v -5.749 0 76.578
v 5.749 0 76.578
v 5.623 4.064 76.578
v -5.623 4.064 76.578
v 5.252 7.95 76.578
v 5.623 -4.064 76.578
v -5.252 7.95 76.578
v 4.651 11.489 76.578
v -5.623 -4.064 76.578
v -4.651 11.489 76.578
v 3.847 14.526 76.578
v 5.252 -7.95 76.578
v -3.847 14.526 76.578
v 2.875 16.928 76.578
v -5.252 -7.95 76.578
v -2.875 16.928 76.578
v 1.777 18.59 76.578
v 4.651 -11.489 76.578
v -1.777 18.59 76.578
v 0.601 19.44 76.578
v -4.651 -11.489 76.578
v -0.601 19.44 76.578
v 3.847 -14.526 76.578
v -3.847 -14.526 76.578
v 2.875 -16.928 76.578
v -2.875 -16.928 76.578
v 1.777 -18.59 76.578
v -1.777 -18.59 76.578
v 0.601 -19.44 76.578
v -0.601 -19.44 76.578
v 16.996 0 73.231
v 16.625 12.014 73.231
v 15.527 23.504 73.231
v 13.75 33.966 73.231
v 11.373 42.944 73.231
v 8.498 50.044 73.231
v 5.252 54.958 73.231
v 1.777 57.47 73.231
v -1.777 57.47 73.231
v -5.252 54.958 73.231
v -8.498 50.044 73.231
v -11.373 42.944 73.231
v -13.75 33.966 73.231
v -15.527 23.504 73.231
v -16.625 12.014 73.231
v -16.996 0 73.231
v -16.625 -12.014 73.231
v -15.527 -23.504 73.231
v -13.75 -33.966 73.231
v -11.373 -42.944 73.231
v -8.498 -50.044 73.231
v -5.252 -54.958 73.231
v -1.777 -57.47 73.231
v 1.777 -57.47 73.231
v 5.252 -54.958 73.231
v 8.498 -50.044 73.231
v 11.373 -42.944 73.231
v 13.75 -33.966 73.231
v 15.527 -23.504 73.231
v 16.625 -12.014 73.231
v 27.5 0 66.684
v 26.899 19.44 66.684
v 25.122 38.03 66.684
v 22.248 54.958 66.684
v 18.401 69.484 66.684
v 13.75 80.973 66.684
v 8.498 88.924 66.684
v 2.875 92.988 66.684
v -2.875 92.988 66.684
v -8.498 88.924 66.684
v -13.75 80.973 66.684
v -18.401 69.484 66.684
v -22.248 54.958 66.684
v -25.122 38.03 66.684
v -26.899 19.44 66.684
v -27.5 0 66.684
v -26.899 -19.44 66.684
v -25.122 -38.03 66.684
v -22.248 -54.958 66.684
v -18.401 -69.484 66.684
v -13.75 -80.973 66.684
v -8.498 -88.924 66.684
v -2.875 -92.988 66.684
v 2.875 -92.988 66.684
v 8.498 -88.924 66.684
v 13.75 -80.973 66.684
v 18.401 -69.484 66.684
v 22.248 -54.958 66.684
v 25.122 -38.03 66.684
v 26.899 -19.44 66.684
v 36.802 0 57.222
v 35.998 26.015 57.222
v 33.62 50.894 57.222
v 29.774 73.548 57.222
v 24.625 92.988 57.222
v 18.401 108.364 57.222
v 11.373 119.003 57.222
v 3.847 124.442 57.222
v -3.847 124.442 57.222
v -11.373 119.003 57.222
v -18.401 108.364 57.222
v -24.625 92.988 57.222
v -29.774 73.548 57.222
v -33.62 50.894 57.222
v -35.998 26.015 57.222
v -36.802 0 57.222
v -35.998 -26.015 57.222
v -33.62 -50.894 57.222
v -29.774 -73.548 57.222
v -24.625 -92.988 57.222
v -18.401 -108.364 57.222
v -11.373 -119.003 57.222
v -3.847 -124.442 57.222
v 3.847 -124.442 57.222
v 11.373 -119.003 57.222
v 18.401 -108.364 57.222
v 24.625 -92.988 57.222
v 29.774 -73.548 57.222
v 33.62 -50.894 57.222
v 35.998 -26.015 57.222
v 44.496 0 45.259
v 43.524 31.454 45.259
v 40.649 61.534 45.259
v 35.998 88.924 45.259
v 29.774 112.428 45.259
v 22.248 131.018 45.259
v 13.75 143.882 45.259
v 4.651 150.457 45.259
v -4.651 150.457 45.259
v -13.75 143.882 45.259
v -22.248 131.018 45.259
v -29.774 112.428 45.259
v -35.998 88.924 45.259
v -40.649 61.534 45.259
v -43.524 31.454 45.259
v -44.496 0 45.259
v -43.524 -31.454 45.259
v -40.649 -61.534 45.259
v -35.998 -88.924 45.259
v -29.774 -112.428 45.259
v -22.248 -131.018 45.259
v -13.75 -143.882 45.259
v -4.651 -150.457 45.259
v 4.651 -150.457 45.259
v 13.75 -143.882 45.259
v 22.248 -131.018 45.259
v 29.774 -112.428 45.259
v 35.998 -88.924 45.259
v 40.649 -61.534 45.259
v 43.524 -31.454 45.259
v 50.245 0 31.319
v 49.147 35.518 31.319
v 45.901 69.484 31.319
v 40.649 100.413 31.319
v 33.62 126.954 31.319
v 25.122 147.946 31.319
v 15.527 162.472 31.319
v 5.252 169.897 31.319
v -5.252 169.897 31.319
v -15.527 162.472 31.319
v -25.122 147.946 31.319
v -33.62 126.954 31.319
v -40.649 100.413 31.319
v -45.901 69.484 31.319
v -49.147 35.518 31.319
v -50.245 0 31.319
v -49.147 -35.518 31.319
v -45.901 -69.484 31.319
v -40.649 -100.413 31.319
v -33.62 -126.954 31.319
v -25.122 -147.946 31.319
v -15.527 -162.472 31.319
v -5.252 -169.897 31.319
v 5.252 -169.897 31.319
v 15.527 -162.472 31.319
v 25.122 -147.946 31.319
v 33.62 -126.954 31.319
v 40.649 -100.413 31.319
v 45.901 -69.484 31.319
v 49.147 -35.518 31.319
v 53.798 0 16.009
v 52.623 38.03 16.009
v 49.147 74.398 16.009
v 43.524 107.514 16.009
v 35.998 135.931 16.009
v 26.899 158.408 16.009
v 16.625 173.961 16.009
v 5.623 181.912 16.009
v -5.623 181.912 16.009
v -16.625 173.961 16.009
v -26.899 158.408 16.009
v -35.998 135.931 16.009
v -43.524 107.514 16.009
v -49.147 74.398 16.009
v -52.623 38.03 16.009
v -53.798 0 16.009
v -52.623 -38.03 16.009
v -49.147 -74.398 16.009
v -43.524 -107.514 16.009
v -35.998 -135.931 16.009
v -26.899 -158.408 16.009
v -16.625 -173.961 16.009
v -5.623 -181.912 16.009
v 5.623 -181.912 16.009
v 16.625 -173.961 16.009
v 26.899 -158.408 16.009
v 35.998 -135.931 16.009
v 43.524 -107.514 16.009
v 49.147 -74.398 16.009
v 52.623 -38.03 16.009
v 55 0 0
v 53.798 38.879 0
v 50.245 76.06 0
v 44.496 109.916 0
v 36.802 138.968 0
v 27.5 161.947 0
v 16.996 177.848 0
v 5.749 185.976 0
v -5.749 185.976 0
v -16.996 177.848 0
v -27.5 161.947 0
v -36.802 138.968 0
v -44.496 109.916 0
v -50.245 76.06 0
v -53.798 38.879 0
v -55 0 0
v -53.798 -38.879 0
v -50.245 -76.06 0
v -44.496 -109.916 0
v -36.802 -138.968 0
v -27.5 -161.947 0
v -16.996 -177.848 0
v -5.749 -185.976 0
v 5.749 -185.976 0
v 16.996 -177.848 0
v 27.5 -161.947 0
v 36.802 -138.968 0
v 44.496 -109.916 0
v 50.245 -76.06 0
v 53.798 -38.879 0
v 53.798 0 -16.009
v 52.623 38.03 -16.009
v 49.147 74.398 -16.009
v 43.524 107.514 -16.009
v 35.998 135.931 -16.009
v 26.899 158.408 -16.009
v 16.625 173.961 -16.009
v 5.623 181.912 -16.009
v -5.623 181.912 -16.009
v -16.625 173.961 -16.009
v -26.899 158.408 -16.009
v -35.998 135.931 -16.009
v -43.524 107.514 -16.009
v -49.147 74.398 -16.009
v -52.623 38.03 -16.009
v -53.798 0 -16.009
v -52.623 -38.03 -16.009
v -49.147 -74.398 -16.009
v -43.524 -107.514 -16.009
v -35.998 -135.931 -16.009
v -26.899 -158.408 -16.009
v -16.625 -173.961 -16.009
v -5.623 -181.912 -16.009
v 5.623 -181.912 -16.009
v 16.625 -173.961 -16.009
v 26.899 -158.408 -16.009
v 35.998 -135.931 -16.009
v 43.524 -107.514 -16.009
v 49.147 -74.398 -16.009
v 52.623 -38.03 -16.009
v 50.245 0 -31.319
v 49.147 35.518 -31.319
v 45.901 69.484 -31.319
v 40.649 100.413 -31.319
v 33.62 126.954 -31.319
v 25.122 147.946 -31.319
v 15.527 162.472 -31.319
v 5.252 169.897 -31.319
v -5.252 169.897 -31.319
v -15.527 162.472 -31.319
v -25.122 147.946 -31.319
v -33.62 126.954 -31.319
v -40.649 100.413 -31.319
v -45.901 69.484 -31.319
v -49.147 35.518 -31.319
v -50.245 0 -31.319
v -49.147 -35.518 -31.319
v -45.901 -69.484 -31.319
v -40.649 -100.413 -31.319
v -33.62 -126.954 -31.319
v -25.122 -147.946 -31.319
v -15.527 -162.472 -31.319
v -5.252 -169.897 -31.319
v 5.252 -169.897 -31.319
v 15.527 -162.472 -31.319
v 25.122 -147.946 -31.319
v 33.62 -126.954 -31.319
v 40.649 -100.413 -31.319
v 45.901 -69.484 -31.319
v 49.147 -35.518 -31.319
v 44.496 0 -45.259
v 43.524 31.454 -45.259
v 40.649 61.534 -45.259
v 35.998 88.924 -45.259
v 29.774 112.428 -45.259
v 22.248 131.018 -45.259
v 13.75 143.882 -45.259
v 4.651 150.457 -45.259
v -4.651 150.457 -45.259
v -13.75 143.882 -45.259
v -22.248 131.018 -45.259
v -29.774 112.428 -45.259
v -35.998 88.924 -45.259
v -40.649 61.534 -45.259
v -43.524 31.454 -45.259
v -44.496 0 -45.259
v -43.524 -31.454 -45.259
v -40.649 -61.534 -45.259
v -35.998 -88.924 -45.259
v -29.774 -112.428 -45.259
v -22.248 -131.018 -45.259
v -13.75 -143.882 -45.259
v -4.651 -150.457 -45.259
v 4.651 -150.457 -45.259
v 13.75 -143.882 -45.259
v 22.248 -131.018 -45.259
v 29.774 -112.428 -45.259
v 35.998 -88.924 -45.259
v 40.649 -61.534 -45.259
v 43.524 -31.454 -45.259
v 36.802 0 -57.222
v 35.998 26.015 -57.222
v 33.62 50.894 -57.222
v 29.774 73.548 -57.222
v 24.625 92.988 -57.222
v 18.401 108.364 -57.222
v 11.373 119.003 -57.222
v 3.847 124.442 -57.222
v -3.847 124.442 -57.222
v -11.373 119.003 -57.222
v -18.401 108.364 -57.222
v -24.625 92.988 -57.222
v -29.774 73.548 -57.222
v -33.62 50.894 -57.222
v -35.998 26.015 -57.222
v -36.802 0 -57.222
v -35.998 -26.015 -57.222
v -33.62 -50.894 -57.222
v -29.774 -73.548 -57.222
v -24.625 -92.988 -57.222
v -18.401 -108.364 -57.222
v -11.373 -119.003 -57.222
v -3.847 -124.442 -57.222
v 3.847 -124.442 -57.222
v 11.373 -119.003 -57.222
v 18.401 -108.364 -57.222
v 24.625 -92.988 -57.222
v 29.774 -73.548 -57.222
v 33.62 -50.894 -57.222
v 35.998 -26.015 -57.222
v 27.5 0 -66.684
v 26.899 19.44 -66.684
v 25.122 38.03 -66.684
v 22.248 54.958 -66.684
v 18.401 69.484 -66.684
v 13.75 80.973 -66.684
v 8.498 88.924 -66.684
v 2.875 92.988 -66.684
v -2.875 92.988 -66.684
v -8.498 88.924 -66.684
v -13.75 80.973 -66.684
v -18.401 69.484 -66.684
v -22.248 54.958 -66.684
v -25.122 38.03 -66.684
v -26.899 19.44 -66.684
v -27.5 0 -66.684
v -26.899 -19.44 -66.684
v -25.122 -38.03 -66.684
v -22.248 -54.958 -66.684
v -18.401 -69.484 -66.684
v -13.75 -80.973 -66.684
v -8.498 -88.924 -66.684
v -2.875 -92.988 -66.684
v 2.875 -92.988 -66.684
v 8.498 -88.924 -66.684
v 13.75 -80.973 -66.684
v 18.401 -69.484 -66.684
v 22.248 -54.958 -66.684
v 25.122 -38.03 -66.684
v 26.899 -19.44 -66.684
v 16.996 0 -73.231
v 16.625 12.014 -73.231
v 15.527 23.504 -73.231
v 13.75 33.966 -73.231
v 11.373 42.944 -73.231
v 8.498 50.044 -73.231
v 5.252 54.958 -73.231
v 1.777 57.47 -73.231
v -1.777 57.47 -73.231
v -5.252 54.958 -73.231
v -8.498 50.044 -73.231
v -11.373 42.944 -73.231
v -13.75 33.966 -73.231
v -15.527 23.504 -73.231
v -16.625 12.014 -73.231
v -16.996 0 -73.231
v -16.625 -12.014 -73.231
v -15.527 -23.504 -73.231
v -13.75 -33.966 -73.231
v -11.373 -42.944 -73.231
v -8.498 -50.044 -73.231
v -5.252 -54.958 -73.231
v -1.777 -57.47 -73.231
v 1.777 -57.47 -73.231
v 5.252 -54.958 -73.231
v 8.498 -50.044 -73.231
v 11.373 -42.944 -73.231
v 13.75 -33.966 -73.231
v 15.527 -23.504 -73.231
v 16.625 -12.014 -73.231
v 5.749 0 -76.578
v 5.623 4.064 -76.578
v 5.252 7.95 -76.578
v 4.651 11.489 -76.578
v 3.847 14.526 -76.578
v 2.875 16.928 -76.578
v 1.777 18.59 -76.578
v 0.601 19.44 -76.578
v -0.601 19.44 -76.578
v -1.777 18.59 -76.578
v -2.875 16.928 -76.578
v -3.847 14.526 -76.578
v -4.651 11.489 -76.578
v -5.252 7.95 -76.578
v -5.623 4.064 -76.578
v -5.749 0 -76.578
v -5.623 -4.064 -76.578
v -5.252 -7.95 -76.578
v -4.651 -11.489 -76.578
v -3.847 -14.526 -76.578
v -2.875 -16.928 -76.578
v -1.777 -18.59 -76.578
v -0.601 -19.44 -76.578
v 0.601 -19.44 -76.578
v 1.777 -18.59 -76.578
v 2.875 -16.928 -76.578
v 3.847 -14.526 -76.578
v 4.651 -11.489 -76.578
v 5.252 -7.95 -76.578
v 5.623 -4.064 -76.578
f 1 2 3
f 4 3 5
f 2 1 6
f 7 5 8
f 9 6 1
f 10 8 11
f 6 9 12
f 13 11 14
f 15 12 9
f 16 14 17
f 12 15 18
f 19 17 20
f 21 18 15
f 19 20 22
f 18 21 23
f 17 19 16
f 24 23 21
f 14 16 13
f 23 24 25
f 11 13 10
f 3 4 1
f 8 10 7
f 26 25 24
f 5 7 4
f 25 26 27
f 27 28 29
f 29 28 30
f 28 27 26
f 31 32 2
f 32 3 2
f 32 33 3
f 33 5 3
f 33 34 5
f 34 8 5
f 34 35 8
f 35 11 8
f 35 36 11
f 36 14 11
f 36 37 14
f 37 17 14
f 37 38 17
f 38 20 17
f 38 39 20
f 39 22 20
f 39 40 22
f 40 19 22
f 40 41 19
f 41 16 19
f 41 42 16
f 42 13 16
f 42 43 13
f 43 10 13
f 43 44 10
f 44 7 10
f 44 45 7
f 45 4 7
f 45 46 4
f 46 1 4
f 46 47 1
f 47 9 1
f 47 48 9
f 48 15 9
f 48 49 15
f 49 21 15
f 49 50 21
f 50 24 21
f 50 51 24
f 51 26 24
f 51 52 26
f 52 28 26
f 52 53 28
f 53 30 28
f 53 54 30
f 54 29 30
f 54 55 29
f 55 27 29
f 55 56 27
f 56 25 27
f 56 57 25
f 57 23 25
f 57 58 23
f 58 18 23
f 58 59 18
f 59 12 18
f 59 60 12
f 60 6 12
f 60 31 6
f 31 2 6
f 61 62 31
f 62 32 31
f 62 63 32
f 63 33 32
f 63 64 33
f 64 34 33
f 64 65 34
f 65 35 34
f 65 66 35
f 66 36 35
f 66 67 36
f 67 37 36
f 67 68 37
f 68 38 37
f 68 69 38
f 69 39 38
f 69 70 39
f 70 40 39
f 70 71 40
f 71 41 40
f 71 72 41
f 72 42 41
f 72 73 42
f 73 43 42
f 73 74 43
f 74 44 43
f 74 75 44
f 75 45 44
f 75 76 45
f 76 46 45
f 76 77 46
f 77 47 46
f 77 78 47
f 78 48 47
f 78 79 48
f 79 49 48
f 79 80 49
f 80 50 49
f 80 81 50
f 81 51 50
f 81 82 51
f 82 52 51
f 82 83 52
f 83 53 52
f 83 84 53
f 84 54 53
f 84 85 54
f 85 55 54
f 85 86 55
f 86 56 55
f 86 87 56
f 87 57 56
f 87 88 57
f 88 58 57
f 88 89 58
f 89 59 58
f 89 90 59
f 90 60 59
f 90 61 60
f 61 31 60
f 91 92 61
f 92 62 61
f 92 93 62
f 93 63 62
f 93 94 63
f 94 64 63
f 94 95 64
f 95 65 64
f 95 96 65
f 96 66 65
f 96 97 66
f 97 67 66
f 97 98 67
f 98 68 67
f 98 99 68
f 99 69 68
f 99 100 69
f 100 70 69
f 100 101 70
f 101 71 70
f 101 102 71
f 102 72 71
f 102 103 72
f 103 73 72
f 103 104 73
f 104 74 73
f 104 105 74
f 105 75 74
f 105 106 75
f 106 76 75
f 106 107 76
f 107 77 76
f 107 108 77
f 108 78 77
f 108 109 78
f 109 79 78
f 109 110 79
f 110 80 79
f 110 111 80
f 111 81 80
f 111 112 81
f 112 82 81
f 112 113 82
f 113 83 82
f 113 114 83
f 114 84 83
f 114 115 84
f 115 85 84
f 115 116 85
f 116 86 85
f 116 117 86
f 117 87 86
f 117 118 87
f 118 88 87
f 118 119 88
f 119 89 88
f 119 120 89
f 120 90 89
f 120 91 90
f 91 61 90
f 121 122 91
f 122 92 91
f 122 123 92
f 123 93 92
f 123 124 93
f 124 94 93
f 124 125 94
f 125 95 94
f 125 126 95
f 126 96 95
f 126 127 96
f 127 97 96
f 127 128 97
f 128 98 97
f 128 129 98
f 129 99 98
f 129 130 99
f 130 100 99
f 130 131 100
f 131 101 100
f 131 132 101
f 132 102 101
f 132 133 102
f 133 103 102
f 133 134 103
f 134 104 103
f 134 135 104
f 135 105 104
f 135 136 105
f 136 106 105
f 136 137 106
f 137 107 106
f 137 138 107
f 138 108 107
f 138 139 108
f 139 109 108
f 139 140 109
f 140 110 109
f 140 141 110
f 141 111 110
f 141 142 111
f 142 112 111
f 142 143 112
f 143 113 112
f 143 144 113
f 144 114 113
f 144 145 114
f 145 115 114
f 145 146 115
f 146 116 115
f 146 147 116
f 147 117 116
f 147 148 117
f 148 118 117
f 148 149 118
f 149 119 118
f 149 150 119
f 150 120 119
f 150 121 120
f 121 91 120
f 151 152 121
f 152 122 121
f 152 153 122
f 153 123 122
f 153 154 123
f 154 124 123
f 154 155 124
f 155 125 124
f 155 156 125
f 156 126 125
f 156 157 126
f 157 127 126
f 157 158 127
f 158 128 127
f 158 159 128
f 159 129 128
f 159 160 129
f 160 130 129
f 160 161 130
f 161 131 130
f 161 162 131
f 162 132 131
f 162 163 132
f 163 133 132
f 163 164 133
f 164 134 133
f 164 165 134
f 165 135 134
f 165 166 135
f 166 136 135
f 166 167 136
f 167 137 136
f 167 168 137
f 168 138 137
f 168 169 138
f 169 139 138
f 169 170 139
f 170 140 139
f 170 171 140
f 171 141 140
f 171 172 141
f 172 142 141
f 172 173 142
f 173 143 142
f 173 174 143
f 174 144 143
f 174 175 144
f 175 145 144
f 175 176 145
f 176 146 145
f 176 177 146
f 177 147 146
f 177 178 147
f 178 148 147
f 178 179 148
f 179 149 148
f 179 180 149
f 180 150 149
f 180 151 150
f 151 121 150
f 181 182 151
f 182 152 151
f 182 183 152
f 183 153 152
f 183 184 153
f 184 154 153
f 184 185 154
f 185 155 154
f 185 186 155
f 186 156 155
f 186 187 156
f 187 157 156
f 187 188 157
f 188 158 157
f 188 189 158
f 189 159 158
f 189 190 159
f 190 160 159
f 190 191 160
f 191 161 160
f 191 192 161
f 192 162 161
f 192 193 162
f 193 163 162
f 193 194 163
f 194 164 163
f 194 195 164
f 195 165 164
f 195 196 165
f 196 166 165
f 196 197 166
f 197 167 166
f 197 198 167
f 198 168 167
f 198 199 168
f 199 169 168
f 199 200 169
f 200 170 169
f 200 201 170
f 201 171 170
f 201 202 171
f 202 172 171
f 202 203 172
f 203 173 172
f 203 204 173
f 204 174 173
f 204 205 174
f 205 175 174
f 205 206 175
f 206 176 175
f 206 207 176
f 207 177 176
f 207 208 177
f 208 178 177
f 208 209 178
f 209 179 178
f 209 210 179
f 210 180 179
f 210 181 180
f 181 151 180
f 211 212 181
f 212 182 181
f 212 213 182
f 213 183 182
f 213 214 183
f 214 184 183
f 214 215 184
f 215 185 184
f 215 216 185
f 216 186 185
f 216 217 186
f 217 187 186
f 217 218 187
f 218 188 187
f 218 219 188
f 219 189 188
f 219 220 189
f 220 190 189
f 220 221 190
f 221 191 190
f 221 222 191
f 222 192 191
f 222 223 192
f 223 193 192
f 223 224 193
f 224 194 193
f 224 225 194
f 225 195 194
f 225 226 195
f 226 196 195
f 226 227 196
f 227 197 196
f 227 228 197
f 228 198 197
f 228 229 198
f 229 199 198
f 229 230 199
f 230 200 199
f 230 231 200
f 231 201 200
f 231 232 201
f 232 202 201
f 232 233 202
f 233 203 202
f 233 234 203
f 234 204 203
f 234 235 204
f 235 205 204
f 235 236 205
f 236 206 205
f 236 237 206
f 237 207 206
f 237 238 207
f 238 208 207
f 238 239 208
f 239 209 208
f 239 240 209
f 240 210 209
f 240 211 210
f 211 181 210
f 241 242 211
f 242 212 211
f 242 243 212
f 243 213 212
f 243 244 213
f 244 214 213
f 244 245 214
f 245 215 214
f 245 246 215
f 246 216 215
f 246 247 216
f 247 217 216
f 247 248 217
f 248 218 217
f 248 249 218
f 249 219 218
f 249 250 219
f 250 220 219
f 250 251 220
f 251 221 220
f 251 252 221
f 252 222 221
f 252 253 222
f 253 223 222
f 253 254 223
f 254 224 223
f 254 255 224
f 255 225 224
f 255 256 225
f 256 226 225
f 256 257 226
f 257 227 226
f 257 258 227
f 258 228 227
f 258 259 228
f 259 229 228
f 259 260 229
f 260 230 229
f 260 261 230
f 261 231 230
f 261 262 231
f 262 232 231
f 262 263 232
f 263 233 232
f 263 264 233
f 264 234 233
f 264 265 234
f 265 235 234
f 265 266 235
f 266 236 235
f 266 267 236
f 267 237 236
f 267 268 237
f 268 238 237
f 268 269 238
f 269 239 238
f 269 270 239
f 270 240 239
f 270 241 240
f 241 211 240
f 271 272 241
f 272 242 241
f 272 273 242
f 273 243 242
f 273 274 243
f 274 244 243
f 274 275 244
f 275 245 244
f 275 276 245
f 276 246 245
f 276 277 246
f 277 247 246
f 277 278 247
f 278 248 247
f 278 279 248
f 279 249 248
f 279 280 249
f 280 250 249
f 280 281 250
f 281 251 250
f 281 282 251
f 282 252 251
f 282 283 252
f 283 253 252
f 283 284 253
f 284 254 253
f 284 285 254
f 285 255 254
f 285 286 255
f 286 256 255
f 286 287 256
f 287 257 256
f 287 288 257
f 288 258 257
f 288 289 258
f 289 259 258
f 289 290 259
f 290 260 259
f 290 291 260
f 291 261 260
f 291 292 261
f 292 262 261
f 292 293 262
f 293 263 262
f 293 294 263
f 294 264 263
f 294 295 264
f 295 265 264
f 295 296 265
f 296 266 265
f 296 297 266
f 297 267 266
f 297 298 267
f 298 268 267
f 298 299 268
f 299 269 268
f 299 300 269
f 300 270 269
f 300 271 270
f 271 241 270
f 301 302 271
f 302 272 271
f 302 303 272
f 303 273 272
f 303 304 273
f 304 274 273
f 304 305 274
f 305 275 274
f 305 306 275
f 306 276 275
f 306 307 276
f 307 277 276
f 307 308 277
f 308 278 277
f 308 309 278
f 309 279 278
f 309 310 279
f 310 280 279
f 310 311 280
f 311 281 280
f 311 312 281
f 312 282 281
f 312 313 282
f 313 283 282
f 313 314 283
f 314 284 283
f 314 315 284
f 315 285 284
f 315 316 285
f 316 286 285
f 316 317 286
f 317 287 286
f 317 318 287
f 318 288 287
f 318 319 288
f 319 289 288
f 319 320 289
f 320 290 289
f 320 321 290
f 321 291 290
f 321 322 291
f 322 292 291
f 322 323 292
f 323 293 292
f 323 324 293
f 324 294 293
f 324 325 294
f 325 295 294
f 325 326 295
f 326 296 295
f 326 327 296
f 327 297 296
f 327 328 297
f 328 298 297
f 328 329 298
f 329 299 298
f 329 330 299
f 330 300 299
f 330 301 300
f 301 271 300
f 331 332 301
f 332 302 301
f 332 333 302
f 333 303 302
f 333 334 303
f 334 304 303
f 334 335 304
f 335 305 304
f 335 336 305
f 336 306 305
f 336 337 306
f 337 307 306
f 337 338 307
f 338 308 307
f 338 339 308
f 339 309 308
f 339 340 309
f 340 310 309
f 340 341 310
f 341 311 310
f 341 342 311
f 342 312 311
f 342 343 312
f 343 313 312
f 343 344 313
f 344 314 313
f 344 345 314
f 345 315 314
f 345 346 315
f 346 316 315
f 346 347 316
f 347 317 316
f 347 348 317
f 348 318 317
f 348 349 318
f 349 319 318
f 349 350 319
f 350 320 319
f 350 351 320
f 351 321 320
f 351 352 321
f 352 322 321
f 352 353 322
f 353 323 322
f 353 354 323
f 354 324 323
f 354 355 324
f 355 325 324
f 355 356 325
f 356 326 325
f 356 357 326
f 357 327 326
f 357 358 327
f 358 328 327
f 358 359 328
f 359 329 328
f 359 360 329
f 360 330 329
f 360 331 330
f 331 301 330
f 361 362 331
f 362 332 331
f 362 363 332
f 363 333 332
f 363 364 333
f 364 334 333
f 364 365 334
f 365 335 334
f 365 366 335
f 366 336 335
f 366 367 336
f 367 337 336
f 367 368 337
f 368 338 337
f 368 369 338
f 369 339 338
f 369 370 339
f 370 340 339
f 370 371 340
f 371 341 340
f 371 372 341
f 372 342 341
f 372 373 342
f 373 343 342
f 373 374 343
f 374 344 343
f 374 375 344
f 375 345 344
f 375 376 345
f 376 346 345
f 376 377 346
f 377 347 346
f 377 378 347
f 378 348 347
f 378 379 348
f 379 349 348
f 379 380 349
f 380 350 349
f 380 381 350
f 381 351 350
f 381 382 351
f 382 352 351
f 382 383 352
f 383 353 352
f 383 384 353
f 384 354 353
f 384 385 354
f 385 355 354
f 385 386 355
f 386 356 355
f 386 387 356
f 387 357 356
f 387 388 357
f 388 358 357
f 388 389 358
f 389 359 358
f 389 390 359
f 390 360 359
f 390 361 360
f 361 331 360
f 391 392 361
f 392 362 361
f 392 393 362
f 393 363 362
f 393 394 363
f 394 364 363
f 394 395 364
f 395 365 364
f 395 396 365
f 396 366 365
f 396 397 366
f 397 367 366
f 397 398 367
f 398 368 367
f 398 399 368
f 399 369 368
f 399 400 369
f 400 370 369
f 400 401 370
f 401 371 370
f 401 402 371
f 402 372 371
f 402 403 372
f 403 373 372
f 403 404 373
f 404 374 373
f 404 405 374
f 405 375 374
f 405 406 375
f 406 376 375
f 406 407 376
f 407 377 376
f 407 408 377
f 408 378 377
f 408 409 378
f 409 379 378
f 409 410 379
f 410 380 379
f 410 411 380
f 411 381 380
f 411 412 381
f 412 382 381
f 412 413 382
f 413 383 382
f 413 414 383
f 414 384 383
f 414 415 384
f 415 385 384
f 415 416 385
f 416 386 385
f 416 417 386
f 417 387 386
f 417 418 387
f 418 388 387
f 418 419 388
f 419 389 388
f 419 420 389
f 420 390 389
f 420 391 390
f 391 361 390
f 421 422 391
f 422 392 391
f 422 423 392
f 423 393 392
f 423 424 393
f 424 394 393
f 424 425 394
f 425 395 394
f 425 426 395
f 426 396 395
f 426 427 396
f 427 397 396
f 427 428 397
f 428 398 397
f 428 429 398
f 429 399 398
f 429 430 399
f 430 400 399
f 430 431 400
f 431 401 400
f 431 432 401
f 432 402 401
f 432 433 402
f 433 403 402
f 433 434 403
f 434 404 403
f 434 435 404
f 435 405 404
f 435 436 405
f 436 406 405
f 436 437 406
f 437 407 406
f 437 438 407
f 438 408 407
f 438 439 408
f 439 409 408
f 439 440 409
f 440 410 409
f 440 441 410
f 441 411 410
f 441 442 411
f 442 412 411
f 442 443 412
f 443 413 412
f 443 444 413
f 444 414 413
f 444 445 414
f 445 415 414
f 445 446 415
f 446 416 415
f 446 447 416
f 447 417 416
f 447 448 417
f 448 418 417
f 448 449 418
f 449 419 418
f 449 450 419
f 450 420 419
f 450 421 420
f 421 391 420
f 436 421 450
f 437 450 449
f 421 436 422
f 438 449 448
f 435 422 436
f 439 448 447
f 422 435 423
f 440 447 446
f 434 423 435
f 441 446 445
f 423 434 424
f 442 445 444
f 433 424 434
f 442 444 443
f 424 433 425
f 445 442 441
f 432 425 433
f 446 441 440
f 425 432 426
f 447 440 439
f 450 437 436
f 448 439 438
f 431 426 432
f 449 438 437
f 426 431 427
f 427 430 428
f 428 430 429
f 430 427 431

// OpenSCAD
// Generated by SolidPython 1.0.1 on 2020-07-29 00:46:46


scale(v = [5, 17, 7]) {
	sphere(r = 11);
}
/***********************************************
*********      SolidPython code:      **********
************************************************
 
# import packages: SolidPython
from solid import *
from solid.utils import *
from itertools import chain, combinations, permutations


class Resize:

    def __init__(self, scad_file):
        self.scad_file = scad_file
        #self.scad_file = import_scad(scad_file)
        # cone/cylinder param:
        self.r1 = 0
        self.r2 = 0
        self.h = 0
        # rectangular prism param:
        self.w = 0
        self.l = 0
        # ellipse param:
        self.r = 0

    # import OpenScad code (file name corresponds to shape)


    # classify shape + parameters
    def assign(self, param1, param2, param3):
        if self.scad_file == 'cone.scad':
            self.r1 = param1
            self.r2 = param2
            self.h = param3
        elif self.scad_file == 'cylinder.scad':
            self.r1 = param1
            self.r2 = param2
            self.h = param3
        elif self.scad_file == 'rectangularPrism.scad':
            self.h = param1
            self.l = param2
            self.w = param3
        else:
            self.r = param1
            self.h = param2

    # resize parameters
    def iterate(self):
        x = range(3, 20, 2)
        i = 1
        if self.scad_file == 'cone.scad':
            tempList = list(permutations(x, 2))
            for temp in tempList:
                param1 = temp[0]
                param2 = temp[1]
                filepath = 'produced_scad_files/' + 'cone' + str(param1) + '_' + str(param2) + '_' + '.scad'
                scad_render_to_file(cylinder(h=param1, r1=param2, r2=0), filepath)

        elif self.scad_file == 'cylinder.scad':
            tempList = list(permutations(x, 3))
            for temp in tempList:
                param1 = temp[0]
                param2 = temp[1]
                filepath = 'produced_scad_files/' + 'cylinder' + str(param1) + '_' + str(param2) + '_' + '.scad'
                scad_render_to_file(cylinder(h=param1, r1=param2, r2=param2), filepath)

        elif self.scad_file == 'rectangularPrism.scad':
            tempList = list(permutations(x, 3))
            for temp in tempList:
                param1 = temp[0]
                param2 = temp[1]
                param3 = temp[2]
                filepath = 'produced_scad_files/' + 'rectangularPrism' + str(param1) + '_' + str(param2) + '_' + str(
                    param3) + '.scad'
                scad_render_to_file(cube(size=(param1, param2, param3)), filepath)

        elif self.scad_file == 'ellipse.scad':
            tempList = list(permutations(x, 4))
            for temp in tempList:
                param1 = temp[0]
                param2 = temp[1]
                param3 = temp[2]
                param4 = temp[3]
                filepath = 'produced_scad_files/' + 'ellipse' + str(param1) + '_' + str(param2) + '_' + str(param3) + '_' + str(param4) + '.scad'
                scad_render_to_file(scale([param1, param2, param3])(sphere(r=param4)), filepath)

    def render_to_scadfile(self):
        scad_render_to_file(scad, 'example.scad') 
 
************************************************/
